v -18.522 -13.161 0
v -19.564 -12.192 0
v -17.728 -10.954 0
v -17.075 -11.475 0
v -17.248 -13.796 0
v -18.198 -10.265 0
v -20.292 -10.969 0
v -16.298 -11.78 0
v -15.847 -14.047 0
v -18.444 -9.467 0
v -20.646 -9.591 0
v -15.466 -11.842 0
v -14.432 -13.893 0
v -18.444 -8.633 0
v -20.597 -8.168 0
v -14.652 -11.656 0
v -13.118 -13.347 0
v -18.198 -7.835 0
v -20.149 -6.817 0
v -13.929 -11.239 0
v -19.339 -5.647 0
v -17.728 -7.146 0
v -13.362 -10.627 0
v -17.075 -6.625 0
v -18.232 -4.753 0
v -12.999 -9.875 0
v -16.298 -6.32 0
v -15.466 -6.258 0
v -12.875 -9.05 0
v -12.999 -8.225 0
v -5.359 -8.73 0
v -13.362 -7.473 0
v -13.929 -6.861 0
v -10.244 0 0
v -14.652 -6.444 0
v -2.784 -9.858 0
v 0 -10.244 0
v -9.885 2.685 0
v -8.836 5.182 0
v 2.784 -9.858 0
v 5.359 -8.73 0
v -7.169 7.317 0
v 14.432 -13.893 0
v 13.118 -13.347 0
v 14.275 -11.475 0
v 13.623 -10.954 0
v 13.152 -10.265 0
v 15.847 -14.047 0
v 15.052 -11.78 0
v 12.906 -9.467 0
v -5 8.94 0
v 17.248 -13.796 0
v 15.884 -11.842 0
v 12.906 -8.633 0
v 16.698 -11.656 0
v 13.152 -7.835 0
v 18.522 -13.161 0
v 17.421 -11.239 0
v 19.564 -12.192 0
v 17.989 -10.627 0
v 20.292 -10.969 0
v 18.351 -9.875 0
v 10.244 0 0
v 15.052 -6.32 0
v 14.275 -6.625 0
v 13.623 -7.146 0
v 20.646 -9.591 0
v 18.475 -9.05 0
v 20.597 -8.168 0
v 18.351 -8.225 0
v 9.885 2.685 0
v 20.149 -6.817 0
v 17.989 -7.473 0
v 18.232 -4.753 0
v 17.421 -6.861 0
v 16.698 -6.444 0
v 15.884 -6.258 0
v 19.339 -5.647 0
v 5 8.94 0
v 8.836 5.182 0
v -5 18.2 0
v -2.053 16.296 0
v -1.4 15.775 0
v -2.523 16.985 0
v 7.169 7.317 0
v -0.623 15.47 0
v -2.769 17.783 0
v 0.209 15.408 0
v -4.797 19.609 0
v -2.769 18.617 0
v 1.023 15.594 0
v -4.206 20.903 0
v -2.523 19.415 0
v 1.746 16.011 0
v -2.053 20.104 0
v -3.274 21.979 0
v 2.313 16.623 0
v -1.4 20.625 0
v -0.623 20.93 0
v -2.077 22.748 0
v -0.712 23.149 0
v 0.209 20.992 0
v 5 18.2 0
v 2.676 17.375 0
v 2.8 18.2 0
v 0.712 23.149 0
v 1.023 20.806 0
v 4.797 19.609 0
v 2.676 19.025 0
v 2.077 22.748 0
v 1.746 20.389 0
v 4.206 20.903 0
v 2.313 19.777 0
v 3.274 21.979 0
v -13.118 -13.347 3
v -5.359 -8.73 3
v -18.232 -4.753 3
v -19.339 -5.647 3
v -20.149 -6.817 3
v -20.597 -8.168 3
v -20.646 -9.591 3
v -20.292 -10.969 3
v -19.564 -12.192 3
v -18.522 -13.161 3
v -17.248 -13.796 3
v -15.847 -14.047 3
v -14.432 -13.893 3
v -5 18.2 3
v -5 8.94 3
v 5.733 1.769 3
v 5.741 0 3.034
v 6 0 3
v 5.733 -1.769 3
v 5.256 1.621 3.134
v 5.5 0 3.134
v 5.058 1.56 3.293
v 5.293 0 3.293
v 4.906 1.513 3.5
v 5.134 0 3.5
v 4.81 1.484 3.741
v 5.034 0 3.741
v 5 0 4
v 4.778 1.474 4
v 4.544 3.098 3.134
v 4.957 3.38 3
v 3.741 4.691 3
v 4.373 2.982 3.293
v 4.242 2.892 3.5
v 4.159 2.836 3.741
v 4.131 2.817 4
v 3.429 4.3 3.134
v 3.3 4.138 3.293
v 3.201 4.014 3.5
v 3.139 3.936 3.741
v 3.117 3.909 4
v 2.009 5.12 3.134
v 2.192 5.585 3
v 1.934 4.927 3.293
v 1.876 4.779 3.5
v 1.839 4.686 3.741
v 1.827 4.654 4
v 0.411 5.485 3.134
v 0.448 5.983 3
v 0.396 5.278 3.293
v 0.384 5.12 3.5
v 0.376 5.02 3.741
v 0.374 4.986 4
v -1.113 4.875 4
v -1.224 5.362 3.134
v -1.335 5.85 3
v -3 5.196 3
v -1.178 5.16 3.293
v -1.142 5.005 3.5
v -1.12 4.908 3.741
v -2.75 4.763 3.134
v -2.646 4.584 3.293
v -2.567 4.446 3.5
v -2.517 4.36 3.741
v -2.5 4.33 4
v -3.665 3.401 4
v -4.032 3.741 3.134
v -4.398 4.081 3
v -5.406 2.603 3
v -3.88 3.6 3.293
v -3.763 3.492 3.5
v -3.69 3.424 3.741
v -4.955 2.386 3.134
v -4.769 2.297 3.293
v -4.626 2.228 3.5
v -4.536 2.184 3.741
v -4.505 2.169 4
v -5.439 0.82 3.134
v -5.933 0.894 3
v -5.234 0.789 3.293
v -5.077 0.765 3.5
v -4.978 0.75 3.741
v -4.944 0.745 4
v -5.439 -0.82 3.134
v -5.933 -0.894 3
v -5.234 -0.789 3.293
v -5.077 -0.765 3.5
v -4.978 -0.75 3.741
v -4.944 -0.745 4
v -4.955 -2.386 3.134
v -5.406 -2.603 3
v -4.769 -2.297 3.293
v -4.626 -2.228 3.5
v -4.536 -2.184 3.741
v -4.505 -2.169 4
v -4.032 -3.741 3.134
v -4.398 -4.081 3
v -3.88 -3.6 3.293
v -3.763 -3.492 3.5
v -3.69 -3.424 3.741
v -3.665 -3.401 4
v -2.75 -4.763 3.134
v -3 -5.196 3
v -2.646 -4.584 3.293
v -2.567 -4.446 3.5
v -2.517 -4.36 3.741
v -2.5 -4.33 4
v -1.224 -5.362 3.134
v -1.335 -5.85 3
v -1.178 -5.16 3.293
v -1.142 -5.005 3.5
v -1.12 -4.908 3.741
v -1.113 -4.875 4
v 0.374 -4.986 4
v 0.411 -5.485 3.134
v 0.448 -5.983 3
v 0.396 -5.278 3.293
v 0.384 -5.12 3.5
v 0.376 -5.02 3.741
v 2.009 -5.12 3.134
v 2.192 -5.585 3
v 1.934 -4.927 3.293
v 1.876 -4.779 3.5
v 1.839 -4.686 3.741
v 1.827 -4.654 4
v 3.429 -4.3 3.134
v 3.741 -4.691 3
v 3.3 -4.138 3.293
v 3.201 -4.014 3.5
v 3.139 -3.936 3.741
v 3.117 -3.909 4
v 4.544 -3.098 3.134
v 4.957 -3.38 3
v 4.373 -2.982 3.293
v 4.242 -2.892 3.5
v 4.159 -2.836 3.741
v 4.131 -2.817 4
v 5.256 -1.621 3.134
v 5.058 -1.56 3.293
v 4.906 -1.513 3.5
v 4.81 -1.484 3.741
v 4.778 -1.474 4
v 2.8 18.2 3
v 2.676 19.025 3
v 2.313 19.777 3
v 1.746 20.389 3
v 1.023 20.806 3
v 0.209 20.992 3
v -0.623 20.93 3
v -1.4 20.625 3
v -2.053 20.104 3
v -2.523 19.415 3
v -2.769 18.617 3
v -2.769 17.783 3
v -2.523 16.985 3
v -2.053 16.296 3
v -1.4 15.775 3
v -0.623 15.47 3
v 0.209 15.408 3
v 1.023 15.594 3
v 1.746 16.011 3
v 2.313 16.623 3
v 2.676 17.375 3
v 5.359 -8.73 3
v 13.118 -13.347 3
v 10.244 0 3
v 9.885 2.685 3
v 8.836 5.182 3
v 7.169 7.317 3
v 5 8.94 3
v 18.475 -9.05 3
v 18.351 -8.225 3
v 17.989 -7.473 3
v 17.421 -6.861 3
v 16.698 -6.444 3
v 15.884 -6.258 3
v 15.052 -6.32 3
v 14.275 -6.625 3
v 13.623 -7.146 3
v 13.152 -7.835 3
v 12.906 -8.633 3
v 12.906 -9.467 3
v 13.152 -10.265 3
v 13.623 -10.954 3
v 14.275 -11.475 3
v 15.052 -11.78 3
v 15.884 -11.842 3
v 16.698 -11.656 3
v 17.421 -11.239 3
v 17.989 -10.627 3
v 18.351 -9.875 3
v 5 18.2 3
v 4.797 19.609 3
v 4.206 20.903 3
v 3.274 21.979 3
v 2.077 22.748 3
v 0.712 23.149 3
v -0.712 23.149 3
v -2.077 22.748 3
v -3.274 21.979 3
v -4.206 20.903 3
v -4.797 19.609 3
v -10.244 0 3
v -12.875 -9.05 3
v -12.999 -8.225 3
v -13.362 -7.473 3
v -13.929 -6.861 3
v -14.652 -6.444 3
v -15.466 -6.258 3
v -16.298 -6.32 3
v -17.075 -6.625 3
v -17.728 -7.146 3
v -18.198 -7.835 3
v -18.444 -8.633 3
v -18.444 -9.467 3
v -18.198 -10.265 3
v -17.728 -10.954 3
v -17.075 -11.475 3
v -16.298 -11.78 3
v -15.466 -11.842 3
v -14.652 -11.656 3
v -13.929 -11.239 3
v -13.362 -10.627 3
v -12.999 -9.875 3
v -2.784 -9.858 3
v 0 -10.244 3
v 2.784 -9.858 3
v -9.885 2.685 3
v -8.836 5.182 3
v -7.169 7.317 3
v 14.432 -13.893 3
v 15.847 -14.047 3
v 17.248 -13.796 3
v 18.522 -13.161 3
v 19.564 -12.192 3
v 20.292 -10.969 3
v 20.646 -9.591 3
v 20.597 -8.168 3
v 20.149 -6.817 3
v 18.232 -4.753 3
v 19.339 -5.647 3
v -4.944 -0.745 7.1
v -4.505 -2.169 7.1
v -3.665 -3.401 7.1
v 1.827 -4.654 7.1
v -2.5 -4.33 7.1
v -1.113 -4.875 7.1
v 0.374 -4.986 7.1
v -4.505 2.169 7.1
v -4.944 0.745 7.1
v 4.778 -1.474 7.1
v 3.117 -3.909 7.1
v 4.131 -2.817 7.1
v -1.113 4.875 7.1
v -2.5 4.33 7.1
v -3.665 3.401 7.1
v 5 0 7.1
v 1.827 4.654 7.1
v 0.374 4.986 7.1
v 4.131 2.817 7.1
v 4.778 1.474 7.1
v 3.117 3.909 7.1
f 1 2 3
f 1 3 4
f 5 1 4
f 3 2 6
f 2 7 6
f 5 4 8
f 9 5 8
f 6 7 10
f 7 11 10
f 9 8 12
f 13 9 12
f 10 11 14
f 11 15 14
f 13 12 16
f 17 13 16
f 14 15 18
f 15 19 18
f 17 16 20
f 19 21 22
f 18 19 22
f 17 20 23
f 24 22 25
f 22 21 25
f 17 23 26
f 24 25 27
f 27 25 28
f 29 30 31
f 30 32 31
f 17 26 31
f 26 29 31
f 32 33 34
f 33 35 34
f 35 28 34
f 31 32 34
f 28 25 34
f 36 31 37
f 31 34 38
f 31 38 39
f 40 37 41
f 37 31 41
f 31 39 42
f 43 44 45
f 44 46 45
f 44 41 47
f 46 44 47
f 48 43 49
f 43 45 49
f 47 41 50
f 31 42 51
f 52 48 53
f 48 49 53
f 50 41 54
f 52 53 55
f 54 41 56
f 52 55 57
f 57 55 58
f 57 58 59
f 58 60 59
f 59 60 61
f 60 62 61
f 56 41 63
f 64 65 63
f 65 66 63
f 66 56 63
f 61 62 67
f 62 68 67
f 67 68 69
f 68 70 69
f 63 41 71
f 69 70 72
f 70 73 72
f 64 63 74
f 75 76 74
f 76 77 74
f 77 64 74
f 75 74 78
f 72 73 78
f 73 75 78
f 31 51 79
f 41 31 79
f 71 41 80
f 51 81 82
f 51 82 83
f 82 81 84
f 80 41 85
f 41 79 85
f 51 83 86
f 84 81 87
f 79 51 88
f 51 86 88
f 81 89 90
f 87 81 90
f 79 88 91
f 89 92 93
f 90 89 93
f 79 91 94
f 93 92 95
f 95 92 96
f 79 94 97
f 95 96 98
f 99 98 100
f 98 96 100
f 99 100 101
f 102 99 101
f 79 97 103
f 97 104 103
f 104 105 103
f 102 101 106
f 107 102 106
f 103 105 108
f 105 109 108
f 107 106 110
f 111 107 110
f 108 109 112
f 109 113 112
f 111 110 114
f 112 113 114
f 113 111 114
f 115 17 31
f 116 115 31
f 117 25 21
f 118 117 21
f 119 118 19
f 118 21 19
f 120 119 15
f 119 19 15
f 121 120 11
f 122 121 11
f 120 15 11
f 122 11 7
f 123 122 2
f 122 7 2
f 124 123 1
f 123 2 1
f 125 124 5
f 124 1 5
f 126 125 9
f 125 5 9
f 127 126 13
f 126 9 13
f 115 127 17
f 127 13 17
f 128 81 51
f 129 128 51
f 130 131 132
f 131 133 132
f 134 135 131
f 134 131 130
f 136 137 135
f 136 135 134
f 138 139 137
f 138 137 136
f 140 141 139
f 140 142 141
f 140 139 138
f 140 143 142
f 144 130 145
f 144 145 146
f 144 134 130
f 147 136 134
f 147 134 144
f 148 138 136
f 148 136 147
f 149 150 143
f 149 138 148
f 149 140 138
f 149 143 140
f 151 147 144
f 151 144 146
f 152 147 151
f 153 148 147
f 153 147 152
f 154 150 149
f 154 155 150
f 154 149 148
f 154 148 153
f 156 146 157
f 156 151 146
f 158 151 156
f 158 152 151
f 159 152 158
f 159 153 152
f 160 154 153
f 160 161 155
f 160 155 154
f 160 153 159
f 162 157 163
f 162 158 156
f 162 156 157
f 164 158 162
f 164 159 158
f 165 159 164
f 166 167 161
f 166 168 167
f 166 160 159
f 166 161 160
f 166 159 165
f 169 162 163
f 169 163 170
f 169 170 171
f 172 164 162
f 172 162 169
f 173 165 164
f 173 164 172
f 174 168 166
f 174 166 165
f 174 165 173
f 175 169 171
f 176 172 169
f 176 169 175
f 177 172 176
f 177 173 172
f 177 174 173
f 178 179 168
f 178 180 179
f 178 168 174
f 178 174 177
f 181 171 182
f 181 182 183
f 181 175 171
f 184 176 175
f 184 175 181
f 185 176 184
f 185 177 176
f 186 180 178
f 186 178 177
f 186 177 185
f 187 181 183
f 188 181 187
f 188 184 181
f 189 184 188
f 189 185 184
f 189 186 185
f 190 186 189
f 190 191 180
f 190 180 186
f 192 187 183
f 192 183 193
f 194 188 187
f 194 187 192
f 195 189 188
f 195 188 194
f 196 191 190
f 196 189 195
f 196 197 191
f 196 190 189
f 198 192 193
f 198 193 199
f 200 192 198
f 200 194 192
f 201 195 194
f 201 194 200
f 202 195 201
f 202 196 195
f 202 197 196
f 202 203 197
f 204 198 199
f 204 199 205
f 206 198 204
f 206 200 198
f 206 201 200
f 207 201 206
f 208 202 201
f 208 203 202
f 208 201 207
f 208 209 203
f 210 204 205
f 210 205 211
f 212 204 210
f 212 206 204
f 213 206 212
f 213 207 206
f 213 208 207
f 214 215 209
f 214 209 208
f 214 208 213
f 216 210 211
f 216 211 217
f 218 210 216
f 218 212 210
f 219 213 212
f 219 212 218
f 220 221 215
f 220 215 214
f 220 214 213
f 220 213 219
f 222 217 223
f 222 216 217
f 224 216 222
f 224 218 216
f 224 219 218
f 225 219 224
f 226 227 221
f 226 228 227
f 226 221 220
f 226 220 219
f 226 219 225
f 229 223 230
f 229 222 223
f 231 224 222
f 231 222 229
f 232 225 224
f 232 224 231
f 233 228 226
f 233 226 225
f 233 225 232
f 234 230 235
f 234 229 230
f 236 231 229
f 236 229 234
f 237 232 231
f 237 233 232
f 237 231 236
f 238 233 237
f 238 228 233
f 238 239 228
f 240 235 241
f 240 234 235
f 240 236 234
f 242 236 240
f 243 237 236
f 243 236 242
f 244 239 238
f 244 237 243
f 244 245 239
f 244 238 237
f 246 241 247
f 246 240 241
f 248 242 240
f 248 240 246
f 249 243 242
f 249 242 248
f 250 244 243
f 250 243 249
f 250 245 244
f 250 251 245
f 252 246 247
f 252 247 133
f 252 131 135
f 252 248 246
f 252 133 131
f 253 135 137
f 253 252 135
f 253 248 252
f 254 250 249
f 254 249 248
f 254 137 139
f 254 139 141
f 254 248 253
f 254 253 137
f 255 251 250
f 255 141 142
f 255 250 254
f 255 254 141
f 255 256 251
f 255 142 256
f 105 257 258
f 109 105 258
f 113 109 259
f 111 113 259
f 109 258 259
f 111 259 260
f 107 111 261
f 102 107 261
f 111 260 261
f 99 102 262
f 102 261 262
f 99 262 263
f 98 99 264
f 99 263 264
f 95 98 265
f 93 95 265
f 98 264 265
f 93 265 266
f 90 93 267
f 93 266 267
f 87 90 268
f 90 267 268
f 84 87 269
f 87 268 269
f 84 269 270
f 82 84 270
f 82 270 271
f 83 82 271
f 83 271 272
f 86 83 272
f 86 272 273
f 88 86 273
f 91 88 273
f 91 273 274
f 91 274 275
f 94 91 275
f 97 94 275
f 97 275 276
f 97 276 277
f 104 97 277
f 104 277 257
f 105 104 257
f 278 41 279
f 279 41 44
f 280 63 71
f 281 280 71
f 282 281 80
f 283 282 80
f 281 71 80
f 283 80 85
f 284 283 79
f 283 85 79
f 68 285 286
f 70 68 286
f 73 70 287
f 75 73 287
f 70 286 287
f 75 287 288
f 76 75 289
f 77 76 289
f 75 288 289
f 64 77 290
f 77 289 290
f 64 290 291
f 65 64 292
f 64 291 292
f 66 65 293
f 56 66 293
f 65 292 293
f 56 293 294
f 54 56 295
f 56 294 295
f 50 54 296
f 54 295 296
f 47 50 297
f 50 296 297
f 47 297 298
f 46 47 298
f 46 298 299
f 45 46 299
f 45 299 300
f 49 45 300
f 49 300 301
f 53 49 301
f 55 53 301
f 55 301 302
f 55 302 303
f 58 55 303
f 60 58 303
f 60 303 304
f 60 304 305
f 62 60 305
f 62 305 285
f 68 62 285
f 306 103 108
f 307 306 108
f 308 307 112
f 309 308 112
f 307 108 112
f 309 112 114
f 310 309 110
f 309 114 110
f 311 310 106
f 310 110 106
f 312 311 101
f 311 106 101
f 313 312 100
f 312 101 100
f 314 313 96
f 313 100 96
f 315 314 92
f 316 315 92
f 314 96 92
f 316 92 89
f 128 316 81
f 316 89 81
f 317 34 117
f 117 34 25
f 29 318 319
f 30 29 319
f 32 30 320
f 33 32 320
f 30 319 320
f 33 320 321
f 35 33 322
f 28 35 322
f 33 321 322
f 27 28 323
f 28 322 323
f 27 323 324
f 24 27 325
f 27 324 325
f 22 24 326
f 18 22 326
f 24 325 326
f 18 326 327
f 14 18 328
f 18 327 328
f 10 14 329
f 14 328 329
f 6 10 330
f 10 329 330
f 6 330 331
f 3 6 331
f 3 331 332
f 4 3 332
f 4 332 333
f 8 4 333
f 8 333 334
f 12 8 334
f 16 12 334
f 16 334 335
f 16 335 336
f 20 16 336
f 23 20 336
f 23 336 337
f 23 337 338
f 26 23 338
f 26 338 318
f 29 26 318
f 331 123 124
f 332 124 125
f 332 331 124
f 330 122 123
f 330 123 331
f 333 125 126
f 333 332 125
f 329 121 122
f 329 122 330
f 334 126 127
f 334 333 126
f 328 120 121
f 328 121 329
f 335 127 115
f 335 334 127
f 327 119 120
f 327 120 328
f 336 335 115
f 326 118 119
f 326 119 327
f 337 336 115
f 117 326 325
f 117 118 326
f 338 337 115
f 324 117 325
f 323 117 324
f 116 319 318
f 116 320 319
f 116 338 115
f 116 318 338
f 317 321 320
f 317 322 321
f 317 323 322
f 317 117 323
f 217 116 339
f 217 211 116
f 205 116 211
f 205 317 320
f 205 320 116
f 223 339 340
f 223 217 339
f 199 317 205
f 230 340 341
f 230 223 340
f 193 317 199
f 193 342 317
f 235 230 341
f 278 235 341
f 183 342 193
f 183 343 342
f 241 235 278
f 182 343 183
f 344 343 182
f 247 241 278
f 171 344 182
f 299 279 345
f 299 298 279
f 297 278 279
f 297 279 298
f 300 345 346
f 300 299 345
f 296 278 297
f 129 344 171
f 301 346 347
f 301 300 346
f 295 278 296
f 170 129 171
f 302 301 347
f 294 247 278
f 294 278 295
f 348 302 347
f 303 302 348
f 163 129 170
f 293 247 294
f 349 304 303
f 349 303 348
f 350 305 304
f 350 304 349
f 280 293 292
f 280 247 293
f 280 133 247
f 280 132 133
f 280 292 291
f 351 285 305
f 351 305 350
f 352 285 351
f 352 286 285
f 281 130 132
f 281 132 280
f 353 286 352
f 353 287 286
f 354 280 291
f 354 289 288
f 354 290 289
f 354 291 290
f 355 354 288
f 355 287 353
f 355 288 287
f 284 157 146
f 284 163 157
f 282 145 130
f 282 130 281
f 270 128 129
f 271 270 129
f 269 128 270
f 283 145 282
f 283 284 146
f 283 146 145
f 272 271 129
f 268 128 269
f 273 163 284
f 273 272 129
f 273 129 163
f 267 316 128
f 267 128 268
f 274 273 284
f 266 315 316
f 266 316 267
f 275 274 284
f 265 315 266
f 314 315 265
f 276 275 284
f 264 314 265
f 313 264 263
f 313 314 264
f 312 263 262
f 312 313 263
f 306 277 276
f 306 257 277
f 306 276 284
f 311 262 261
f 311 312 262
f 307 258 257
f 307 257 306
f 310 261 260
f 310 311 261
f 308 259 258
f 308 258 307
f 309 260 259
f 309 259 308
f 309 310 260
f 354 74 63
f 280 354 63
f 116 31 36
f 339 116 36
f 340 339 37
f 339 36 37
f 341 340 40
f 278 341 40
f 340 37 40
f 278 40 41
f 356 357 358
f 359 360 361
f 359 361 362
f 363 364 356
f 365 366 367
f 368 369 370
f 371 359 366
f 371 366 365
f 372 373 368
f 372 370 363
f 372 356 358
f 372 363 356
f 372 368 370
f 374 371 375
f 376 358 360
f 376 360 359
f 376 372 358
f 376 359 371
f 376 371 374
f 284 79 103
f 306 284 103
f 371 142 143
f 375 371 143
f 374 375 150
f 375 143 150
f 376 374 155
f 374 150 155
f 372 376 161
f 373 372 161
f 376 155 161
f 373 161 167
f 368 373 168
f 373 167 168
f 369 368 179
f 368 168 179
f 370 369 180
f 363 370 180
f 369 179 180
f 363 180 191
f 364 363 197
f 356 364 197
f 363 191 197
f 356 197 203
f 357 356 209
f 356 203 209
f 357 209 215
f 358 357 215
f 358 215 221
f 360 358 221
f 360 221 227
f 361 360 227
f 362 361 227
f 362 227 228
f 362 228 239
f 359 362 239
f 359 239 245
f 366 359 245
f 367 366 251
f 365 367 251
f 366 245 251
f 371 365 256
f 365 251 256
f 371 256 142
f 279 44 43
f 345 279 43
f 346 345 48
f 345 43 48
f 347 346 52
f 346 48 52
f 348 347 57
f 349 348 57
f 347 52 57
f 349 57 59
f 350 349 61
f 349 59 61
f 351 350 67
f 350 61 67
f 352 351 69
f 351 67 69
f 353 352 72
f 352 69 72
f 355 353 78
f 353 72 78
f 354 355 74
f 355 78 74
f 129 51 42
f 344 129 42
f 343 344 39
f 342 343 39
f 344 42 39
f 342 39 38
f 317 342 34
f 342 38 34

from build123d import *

# Parameters (mm, degrees)
SALIENTE_EXTRUIR1_DEPTH = 3
CROQUIS2_R              = 2.8
CORTAR_EXTRUIR3_DEPTH   = 5.5
CROQUIS3_R              = 5
SALIENTE_EXTRUIR2_DEPTH = 4.1
REDONDEO1_R             = 1


with BuildPart() as part:
    # Croquis1 → Saliente-Extruir1 (new body)
    with BuildSketch(Plane.XY):
        with BuildLine():
            Line((-13.118348224, -13.346885602), (-5.358962429, -8.729934305))
            ThreePointArc((-5.358962429, -8.729934305), (0, -10.243545836), (5.358962429, -8.729934305))
            Line((5.358962429, -8.729934305), (13.118348224, -13.346885602))
            ThreePointArc((13.118348224, -13.346885602), (19.97194541, -11.606711584), (18.231771393, -4.753114398))
            Line((18.231771393, -4.753114398), (10.243545836, 0))
            ThreePointArc((10.243545836, 0), (8.83594818, 5.182301714), (5, 8.94037087))
            Line((5, 8.94037087), (5, 18.2))
            ThreePointArc((5, 18.2), (0, 23.2), (-5, 18.2))
            Line((-5, 18.2), (-5, 8.94037087))
            ThreePointArc((-5, 8.94037087), (-8.83594818, 5.182301714), (-10.243545836, 0))
            Line((-10.243545836, 0), (-18.231771393, -4.753114398))
            ThreePointArc((-18.231771393, -4.753114398), (-19.97194541, -11.606711584), (-13.118348224, -13.346885602))
        make_face()
    extrude(amount=SALIENTE_EXTRUIR1_DEPTH)

    # Croquis2 → Cortar-Extruir3 (cut)
    with BuildSketch(Plane.XY.offset(3)):
        with Locations((0, 18.2)):
            Circle(CROQUIS2_R)
        with Locations((15.675059808, -9.05)):
            Circle(CROQUIS2_R)
        with Locations((-15.675059808, -9.05)):
            Circle(CROQUIS2_R)
    extrude(amount=-CORTAR_EXTRUIR3_DEPTH, mode=Mode.SUBTRACT)

    # Croquis3 → Saliente-Extruir2 (add)
    with BuildSketch(Plane.XY.offset(3)):
        Circle(CROQUIS3_R)
    extrude(amount=SALIENTE_EXTRUIR2_DEPTH)

    # Redondeo1
    redondeo1_edges = [part.edges().sort_by_distance(p)[0] for p in [
        (-5, 0, 3),
    ]]
    fillet(redondeo1_edges, radius=REDONDEO1_R)


solid = part.part
